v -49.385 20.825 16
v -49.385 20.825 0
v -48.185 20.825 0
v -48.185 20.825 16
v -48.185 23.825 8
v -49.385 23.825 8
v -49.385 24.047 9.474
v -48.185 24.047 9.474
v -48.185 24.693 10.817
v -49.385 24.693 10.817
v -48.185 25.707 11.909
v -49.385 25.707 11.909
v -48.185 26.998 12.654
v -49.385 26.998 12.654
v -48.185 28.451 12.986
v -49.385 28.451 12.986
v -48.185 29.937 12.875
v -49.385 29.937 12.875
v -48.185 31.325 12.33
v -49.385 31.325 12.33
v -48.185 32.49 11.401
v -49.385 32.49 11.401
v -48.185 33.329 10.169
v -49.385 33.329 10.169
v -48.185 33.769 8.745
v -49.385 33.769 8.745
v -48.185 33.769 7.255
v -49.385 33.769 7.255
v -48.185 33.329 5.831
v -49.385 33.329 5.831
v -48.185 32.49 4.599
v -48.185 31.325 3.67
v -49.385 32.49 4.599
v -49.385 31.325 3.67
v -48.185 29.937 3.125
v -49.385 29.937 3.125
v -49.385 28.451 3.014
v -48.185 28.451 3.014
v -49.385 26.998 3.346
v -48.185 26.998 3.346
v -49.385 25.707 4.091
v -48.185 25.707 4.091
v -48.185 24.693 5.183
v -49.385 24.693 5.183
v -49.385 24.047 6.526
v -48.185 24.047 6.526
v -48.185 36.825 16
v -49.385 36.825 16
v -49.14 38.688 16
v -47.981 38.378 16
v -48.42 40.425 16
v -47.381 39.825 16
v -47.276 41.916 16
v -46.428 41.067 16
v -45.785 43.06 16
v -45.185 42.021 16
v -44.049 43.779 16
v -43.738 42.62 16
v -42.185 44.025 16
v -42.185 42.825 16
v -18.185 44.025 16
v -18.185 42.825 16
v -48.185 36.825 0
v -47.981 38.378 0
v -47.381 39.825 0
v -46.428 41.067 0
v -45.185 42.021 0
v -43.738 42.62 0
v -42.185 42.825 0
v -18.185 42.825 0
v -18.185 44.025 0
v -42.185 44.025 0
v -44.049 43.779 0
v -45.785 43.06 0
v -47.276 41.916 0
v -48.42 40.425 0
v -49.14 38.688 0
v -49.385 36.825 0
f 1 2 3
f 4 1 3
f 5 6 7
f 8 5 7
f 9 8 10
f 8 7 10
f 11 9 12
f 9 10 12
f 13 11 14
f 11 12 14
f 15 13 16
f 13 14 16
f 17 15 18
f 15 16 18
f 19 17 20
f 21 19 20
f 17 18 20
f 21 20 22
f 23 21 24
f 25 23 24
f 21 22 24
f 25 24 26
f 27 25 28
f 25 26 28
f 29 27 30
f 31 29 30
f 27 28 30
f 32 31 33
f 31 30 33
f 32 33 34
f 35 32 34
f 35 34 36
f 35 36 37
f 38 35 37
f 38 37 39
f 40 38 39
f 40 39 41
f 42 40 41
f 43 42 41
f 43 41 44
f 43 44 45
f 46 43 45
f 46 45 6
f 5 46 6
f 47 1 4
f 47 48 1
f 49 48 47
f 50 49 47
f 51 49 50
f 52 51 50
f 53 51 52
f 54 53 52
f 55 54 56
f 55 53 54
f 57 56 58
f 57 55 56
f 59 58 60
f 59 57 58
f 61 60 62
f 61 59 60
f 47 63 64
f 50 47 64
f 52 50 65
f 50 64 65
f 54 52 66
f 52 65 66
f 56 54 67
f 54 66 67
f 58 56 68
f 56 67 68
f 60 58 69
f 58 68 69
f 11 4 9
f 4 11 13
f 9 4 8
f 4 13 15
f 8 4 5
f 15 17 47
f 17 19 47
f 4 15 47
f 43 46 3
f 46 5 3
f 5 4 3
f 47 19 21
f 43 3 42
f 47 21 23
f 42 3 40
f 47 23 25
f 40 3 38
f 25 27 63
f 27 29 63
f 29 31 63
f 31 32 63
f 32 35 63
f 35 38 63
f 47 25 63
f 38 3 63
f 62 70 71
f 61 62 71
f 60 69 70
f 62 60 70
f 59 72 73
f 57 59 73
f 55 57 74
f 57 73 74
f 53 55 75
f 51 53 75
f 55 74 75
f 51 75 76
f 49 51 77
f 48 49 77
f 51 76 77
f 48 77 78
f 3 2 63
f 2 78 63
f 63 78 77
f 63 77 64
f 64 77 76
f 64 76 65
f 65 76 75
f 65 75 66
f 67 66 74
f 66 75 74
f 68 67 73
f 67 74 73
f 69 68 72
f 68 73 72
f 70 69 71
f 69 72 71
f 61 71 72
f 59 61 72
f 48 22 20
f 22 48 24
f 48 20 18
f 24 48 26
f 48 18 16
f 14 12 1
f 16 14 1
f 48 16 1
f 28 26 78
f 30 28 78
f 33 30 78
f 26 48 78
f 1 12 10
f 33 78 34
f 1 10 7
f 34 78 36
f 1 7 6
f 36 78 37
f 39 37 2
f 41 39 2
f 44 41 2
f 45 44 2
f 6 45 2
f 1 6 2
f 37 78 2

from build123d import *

# Parameters (mm, degrees)
F1_DEPTH = 16
F2_R     = 5
F3_DEPTH = 31.200998


with BuildPart() as f1:
    # F0 (on Top) → F1 (new body)
    with BuildSketch(Plane.XY):
        with BuildLine():
            Line((-49.38504, 20.824596), (-48.185041, 20.824596))
            Line((-48.185041, 20.824596), (-48.185041, 36.824596))
            ThreePointArc((-48.185041, 36.824596), (-46.427682, 41.067237), (-42.185041, 42.824596))
            Line((-42.185041, 42.824596), (-18.185041, 42.824596))
            Line((-18.185041, 42.824596), (-18.185041, 44.024594))
            Line((-18.185041, 44.024594), (-42.185041, 44.024594))
            ThreePointArc((-42.185041, 44.024594), (-47.276209, 41.915763), (-49.38504, 36.824596))
            Line((-49.38504, 36.824596), (-49.38504, 20.824596))
        make_face()
    extrude(amount=F1_DEPTH)

    # F2 (on face) → F3 (cut, through all)
    with BuildSketch(Plane(origin=(-49.38504, 0, 0), x_dir=(0, -1, 0), z_dir=(-1, 0, 0))):
        with Locations((-28.824596, 8)):
            Circle(F2_R)
    extrude(amount=-F3_DEPTH, mode=Mode.SUBTRACT)


solid = f1.part
